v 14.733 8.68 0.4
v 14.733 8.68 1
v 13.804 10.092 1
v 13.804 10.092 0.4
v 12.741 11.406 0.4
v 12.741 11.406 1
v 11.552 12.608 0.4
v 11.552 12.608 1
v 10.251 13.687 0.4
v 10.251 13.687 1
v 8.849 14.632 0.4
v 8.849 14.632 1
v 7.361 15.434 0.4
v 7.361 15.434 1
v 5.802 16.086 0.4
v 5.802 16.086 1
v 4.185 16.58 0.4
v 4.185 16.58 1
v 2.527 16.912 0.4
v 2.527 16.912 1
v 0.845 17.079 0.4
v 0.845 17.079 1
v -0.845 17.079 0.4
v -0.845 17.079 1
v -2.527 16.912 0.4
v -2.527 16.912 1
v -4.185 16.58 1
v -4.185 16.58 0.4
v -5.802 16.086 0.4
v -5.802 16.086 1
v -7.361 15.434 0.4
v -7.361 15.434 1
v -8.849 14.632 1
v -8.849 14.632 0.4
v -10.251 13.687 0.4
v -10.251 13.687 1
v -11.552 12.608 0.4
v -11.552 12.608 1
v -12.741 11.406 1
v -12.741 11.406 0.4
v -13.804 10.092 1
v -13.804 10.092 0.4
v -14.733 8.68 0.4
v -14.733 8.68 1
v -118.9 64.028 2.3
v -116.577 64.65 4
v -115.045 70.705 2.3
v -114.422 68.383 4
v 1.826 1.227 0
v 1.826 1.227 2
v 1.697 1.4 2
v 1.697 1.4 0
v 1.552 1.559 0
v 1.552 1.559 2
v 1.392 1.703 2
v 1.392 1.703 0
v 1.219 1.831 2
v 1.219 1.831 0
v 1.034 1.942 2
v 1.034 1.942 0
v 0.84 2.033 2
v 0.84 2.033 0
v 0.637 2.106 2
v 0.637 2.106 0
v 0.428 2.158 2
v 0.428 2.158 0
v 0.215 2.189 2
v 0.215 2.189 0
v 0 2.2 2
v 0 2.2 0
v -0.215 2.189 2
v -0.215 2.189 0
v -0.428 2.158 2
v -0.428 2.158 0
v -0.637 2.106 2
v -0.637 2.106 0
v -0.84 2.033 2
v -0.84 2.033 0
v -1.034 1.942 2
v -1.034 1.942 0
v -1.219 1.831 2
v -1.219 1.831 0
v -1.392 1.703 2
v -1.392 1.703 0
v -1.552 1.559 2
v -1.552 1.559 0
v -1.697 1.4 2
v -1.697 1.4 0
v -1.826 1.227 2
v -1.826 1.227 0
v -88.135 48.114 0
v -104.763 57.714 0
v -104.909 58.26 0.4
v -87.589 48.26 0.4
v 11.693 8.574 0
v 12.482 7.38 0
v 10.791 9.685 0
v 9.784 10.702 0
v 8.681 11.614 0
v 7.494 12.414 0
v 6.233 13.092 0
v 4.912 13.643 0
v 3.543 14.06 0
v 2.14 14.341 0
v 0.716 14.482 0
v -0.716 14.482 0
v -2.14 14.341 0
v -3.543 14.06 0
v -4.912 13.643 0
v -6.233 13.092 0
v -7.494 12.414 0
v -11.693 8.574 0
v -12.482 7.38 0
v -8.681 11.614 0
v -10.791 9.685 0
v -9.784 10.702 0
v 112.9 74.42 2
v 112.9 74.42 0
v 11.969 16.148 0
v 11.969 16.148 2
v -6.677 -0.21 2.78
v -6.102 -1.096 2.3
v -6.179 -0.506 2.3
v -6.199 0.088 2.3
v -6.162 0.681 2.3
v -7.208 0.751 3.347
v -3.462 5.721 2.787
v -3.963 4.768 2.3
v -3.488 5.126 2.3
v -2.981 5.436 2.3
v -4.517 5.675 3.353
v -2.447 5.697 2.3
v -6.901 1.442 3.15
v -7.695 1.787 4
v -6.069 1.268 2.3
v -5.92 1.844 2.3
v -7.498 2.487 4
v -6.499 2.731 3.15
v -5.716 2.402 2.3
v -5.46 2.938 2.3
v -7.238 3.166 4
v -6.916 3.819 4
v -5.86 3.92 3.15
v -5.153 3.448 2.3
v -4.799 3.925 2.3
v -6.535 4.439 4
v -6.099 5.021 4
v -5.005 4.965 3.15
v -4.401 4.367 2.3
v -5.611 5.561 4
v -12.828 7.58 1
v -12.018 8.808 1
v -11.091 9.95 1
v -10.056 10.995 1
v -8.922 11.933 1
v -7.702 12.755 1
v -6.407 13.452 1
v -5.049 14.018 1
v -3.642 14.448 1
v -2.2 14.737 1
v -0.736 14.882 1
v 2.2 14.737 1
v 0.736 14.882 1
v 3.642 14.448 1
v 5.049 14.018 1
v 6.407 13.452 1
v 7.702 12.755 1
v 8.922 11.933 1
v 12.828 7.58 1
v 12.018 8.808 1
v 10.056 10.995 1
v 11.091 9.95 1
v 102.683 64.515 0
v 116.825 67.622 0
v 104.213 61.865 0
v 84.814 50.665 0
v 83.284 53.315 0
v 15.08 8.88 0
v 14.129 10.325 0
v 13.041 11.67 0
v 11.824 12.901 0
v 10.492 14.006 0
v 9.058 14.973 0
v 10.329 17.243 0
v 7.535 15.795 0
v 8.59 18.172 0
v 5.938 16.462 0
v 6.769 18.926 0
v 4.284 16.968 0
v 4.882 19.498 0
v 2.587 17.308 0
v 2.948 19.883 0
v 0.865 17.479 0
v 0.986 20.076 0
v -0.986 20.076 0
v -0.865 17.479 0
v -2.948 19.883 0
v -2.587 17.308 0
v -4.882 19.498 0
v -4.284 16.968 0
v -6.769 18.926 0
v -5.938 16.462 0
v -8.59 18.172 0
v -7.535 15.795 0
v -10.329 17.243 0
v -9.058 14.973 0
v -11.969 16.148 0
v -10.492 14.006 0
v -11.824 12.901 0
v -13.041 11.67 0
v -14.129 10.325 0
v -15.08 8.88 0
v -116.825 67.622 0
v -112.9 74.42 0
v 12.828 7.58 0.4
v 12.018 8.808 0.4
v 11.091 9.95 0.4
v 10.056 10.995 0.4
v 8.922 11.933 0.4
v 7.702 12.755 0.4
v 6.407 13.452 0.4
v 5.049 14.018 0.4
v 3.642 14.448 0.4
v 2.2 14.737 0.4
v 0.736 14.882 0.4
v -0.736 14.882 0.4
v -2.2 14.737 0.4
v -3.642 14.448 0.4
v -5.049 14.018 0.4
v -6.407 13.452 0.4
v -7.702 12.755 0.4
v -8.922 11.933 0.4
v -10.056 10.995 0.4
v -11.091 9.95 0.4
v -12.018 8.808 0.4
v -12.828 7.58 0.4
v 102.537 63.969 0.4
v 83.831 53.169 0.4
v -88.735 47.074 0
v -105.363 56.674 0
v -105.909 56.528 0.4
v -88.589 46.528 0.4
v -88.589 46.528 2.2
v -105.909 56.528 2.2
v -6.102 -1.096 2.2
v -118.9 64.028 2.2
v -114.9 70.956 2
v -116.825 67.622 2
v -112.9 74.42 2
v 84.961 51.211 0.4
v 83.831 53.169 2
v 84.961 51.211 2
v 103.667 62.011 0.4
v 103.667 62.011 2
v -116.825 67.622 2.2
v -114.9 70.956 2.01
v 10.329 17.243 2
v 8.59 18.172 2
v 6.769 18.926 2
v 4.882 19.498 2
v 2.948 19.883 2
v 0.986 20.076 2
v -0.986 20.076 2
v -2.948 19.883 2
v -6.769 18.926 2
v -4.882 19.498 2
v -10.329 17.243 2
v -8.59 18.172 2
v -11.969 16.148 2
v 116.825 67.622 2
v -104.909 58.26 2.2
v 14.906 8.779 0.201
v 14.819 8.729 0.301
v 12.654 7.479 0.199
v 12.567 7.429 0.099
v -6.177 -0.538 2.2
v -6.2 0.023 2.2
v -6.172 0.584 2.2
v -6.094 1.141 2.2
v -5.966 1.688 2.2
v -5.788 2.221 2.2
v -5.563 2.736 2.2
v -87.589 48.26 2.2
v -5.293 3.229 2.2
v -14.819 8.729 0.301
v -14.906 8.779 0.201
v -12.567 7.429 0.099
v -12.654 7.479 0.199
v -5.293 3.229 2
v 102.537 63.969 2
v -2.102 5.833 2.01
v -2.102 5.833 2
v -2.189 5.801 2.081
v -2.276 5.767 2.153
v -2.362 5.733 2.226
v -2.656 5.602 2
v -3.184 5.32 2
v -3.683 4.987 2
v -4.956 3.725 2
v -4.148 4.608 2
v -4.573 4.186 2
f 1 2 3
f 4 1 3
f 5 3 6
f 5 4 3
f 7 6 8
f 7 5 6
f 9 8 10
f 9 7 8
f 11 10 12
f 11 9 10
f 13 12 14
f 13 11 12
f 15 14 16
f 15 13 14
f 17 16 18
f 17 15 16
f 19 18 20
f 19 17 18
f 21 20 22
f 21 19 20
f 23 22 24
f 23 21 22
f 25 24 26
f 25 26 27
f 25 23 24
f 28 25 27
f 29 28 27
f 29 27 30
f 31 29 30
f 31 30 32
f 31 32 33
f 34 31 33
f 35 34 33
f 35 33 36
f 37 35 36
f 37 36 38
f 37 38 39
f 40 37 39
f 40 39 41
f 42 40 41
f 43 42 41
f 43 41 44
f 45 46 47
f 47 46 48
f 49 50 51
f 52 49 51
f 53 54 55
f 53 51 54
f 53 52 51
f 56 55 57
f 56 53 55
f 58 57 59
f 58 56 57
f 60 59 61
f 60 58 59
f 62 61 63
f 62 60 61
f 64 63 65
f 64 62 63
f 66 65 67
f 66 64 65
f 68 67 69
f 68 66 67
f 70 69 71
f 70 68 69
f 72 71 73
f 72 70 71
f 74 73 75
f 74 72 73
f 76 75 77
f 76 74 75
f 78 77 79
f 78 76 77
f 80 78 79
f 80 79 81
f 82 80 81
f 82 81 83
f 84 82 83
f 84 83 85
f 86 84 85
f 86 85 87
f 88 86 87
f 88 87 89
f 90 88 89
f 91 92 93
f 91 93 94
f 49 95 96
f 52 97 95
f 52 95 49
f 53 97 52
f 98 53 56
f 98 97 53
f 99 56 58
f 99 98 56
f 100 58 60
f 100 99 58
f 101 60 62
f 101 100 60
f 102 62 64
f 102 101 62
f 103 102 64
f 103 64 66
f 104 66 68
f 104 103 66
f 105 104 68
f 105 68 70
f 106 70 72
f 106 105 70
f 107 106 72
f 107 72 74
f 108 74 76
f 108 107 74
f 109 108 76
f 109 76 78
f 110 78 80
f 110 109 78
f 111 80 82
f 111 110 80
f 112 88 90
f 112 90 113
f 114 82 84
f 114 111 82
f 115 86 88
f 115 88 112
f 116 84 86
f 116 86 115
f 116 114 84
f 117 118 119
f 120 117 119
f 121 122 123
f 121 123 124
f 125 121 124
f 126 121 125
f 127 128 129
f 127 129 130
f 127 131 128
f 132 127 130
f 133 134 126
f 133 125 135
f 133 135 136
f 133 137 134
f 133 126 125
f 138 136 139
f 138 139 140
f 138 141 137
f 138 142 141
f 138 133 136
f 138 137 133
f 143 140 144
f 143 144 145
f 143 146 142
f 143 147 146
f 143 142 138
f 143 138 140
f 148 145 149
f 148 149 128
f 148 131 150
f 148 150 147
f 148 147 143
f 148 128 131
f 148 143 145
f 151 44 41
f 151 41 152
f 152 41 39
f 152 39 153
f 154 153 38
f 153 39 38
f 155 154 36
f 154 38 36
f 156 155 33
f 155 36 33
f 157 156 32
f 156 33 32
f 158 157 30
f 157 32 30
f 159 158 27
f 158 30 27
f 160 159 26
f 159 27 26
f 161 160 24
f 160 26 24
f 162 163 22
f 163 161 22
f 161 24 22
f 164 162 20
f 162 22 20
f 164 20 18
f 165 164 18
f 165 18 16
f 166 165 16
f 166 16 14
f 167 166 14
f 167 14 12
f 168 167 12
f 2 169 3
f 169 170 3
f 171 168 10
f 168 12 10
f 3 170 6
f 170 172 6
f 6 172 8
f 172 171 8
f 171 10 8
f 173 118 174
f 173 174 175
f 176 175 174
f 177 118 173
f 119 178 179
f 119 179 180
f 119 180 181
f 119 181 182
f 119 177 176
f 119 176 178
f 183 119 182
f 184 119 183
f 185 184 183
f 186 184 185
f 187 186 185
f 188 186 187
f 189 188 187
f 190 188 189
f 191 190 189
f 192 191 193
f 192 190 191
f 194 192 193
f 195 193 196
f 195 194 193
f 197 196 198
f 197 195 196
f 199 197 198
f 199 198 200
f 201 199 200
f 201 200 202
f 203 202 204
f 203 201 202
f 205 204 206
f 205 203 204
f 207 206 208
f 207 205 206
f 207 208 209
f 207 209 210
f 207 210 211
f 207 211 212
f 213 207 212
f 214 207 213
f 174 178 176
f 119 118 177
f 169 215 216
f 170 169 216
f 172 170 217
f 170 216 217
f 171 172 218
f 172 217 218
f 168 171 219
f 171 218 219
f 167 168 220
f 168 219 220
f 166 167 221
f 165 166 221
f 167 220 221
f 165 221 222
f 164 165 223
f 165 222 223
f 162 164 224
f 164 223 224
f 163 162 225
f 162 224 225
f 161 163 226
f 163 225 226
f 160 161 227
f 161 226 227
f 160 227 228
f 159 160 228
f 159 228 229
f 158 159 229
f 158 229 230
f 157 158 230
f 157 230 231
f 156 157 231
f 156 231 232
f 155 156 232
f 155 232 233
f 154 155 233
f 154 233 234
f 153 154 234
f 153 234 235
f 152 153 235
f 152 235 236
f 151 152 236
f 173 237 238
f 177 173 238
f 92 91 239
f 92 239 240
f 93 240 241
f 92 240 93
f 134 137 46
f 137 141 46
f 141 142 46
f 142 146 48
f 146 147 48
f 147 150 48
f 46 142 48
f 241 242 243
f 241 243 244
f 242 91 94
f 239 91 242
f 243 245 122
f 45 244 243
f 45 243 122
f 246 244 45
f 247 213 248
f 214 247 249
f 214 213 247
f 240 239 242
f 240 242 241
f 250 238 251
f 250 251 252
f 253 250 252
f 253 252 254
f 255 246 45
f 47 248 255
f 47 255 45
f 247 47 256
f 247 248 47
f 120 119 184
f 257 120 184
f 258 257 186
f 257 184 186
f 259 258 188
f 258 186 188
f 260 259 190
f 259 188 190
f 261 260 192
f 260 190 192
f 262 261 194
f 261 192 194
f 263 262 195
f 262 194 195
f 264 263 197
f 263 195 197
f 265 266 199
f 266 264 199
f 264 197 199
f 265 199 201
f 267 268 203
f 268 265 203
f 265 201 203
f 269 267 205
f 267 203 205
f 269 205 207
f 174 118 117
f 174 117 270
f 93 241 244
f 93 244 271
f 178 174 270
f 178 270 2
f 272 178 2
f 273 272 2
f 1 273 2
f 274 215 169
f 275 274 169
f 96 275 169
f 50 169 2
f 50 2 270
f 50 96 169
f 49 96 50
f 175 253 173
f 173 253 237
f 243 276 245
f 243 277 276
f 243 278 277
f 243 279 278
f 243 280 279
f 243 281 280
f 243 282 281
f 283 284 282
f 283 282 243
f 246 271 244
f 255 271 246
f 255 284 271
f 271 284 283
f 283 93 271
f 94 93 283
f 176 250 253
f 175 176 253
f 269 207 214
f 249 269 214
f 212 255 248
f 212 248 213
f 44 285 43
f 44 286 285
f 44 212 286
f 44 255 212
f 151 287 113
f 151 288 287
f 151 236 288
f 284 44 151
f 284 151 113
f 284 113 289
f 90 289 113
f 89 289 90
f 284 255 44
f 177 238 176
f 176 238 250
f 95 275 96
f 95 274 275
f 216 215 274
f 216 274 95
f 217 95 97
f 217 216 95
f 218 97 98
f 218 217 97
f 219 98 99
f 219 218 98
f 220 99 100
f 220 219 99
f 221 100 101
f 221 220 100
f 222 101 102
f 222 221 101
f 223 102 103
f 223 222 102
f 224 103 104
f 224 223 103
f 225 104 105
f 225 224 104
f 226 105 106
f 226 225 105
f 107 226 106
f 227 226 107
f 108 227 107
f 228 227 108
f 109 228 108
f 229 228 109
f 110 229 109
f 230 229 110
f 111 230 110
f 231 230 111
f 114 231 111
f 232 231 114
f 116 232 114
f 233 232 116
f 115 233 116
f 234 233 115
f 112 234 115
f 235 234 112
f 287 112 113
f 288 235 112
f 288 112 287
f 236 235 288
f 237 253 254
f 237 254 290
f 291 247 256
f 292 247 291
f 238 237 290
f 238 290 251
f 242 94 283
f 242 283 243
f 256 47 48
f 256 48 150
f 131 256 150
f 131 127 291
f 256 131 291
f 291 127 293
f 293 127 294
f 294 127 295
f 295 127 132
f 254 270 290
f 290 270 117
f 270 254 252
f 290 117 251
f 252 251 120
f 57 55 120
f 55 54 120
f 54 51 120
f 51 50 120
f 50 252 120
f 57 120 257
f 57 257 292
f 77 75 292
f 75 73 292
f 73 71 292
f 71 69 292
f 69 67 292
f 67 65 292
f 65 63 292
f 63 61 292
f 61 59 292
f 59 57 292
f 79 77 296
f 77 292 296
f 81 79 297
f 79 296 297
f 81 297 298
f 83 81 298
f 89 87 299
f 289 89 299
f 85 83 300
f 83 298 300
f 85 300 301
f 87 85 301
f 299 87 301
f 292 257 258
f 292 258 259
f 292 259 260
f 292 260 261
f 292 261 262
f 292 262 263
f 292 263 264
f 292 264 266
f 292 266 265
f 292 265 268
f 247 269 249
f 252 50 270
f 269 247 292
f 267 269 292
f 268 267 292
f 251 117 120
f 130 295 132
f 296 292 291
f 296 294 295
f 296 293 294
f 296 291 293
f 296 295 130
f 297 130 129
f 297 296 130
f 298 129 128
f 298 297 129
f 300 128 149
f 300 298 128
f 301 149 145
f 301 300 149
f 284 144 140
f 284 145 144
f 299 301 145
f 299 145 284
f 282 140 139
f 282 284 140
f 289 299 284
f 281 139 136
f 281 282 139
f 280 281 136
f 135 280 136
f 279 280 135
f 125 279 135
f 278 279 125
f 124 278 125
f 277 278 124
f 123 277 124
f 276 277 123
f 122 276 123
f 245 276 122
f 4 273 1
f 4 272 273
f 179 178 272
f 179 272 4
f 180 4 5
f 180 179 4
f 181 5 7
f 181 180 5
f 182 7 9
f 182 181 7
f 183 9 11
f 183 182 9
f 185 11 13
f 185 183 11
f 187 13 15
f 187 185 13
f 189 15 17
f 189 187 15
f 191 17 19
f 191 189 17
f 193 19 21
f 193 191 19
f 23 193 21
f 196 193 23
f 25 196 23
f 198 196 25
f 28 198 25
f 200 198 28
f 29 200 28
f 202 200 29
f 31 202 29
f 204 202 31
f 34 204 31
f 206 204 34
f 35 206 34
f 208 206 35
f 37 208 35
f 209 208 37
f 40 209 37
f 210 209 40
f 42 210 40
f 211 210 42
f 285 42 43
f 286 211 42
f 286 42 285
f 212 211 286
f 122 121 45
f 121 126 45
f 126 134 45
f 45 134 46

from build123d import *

# Parameters (mm, degrees)
SKETCH002_R     = 2.6
PAD001_DEPTH    = 2
PAD002_DEPTH    = 2
POCKET003_DEPTH = 2.201
PAD003_DEPTH    = 2.2
POCKET004_DEPTH = 4.001
SKETCH006_R     = 17.1
SKETCH006_R_2   = 14.9
POCKET002_DEPTH = 1
CHAMFER002_SIZE = 0.4
CHAMFER_SIZE    = 1.99
SKETCH004_R     = 2.2
POCKET_DEPTH    = 4.001
SKETCH005_R     = 6.2
POCKET001_DEPTH = 2.001
SKETCH010_R     = 4
POCKET005_DEPTH = 1
CHAMFER001_SIZE = 1.7
POCKET006_DEPTH = 5


with BuildPart() as part:
    # Sketch002 → Pad001 (new body)
    with BuildSketch(Plane.XY):
        Polygon((-116.824546, 67.621888), (-37.5, 205.016032), (37.5, 205.016032), (116.824546, 67.621888), (0, 0.173205), align=None)
        with Locations((-51.370835, 167.991041)):
            Circle(SKETCH002_R, mode=Mode.SUBTRACT)
        with Locations((51.370835, 167.991041)):
            Circle(SKETCH002_R, mode=Mode.SUBTRACT)
    extrude(amount=PAD001_DEPTH)

    # Sketch003 → Pad002 (join)
    with BuildSketch(Plane.XY.offset(2)):
        Polygon((-118.899546, 64.027883), (-114.899546, 70.956086), (-0.173205, 4.718802), (-0.173205, 0.1), (-4.173205, -2.209401), align=None)
    extrude(amount=PAD002_DEPTH)

    # Sketch007 → Pocket003 (cut, through all)
    with BuildSketch(Plane.XY.offset(2.2)):
        Polygon((-116.824546, 67.621888), (0, 0.173205), (-4.173205, -2.209401), (-118.899546, 64.027883), align=None)
    extrude(amount=-POCKET003_DEPTH, mode=Mode.SUBTRACT)

    # Sketch008 → Pad003 (join)
    with BuildSketch(Plane.XY):
        Polygon((-104.909165, 58.259933), (-87.588657, 48.259933), (-88.588657, 46.527883), (-105.909165, 56.527883), align=None)
    extrude(amount=PAD003_DEPTH)

    # Sketch009 → Pocket004 (cut, through all)
    with BuildSketch(Plane.XY):
        Polygon((83.830836, 53.168669), (84.960836, 51.211452), (103.666985, 62.011452), (102.536985, 63.968669), align=None)
    extrude(amount=POCKET004_DEPTH, mode=Mode.SUBTRACT)

    # Sketch006 → Pocket002 (cut)
    with BuildSketch(Plane.XY):
        Circle(SKETCH006_R)
        Circle(SKETCH006_R_2, mode=Mode.SUBTRACT)
    extrude(amount=POCKET002_DEPTH, mode=Mode.SUBTRACT)

    # Chamfer002
    chamfer002_edges = [part.edges().sort_by_distance(p)[0] for p in [
        (-96.248911, 53.259933, 0),
        (-88.088657, 47.393908, 0),
        (-97.248911, 51.527883, 0),
        (-105.409165, 57.393908, 0),
        (94.313911, 56.611452, 0),
        (103.101985, 62.99006, 0),
        (93.183911, 58.568669, 0),
        (84.395836, 52.19006, 0),
        (0, 14.9, 0),
        (0, 17.1, 0),
    ]]
    chamfer(chamfer002_edges, length=CHAMFER002_SIZE)

    # Chamfer
    chamfer_edges = [part.edges().sort_by_distance(p)[0] for p in [
        (-57.536375, 37.837444, 4),
    ]]
    chamfer(chamfer_edges, length=CHAMFER_SIZE)

    # Sketch004 → Pocket (cut, through all)
    with BuildSketch(Plane.XY):
        Circle(SKETCH004_R)
    extrude(amount=POCKET_DEPTH, mode=Mode.SUBTRACT)

    # Sketch005 → Pocket001 (cut, through all)
    with BuildSketch(Plane.XY.offset(2)):
        Circle(SKETCH005_R)
    extrude(amount=POCKET001_DEPTH, mode=Mode.SUBTRACT)

    # Sketch010 → Pocket005 (cut)
    with BuildSketch(Plane.XY.offset(2)):
        with Locations((-51.370835, 167.991041)):
            Circle(SKETCH010_R)
        with Locations((51.370835, 167.991041)):
            Circle(SKETCH010_R)
    extrude(amount=-POCKET005_DEPTH, mode=Mode.SUBTRACT)

    # Chamfer001
    chamfer001_edges = [part.edges().sort_by_distance(p)[0] for p in [
        (-5.849077, 2.056283, 4),
        (-62.500992, 31.466162, 4),
        (-117.397046, 66.630289, 4),
    ]]
    chamfer(chamfer001_edges, length=CHAMFER001_SIZE)

    # Sketch011 → Pocket006 (cut)
    with BuildSketch(Plane.XY):
        with BuildLine():
            Line((-112.899546, 74.420187), (-37.5, 205.016032))
            Line((-37.5, 205.016032), (37.5, 205.016032))
            Line((37.5, 205.016032), (112.899546, 74.420187))
            Line((112.899546, 74.420187), (11.968954, 16.147883))
            ThreePointArc((11.968954, 16.147883), (0, 20.1), (-11.968954, 16.147883))
            Line((-11.968954, 16.147883), (-112.899546, 74.420187))
        make_face()
    extrude(amount=POCKET006_DEPTH, mode=Mode.SUBTRACT)


solid = part.part
